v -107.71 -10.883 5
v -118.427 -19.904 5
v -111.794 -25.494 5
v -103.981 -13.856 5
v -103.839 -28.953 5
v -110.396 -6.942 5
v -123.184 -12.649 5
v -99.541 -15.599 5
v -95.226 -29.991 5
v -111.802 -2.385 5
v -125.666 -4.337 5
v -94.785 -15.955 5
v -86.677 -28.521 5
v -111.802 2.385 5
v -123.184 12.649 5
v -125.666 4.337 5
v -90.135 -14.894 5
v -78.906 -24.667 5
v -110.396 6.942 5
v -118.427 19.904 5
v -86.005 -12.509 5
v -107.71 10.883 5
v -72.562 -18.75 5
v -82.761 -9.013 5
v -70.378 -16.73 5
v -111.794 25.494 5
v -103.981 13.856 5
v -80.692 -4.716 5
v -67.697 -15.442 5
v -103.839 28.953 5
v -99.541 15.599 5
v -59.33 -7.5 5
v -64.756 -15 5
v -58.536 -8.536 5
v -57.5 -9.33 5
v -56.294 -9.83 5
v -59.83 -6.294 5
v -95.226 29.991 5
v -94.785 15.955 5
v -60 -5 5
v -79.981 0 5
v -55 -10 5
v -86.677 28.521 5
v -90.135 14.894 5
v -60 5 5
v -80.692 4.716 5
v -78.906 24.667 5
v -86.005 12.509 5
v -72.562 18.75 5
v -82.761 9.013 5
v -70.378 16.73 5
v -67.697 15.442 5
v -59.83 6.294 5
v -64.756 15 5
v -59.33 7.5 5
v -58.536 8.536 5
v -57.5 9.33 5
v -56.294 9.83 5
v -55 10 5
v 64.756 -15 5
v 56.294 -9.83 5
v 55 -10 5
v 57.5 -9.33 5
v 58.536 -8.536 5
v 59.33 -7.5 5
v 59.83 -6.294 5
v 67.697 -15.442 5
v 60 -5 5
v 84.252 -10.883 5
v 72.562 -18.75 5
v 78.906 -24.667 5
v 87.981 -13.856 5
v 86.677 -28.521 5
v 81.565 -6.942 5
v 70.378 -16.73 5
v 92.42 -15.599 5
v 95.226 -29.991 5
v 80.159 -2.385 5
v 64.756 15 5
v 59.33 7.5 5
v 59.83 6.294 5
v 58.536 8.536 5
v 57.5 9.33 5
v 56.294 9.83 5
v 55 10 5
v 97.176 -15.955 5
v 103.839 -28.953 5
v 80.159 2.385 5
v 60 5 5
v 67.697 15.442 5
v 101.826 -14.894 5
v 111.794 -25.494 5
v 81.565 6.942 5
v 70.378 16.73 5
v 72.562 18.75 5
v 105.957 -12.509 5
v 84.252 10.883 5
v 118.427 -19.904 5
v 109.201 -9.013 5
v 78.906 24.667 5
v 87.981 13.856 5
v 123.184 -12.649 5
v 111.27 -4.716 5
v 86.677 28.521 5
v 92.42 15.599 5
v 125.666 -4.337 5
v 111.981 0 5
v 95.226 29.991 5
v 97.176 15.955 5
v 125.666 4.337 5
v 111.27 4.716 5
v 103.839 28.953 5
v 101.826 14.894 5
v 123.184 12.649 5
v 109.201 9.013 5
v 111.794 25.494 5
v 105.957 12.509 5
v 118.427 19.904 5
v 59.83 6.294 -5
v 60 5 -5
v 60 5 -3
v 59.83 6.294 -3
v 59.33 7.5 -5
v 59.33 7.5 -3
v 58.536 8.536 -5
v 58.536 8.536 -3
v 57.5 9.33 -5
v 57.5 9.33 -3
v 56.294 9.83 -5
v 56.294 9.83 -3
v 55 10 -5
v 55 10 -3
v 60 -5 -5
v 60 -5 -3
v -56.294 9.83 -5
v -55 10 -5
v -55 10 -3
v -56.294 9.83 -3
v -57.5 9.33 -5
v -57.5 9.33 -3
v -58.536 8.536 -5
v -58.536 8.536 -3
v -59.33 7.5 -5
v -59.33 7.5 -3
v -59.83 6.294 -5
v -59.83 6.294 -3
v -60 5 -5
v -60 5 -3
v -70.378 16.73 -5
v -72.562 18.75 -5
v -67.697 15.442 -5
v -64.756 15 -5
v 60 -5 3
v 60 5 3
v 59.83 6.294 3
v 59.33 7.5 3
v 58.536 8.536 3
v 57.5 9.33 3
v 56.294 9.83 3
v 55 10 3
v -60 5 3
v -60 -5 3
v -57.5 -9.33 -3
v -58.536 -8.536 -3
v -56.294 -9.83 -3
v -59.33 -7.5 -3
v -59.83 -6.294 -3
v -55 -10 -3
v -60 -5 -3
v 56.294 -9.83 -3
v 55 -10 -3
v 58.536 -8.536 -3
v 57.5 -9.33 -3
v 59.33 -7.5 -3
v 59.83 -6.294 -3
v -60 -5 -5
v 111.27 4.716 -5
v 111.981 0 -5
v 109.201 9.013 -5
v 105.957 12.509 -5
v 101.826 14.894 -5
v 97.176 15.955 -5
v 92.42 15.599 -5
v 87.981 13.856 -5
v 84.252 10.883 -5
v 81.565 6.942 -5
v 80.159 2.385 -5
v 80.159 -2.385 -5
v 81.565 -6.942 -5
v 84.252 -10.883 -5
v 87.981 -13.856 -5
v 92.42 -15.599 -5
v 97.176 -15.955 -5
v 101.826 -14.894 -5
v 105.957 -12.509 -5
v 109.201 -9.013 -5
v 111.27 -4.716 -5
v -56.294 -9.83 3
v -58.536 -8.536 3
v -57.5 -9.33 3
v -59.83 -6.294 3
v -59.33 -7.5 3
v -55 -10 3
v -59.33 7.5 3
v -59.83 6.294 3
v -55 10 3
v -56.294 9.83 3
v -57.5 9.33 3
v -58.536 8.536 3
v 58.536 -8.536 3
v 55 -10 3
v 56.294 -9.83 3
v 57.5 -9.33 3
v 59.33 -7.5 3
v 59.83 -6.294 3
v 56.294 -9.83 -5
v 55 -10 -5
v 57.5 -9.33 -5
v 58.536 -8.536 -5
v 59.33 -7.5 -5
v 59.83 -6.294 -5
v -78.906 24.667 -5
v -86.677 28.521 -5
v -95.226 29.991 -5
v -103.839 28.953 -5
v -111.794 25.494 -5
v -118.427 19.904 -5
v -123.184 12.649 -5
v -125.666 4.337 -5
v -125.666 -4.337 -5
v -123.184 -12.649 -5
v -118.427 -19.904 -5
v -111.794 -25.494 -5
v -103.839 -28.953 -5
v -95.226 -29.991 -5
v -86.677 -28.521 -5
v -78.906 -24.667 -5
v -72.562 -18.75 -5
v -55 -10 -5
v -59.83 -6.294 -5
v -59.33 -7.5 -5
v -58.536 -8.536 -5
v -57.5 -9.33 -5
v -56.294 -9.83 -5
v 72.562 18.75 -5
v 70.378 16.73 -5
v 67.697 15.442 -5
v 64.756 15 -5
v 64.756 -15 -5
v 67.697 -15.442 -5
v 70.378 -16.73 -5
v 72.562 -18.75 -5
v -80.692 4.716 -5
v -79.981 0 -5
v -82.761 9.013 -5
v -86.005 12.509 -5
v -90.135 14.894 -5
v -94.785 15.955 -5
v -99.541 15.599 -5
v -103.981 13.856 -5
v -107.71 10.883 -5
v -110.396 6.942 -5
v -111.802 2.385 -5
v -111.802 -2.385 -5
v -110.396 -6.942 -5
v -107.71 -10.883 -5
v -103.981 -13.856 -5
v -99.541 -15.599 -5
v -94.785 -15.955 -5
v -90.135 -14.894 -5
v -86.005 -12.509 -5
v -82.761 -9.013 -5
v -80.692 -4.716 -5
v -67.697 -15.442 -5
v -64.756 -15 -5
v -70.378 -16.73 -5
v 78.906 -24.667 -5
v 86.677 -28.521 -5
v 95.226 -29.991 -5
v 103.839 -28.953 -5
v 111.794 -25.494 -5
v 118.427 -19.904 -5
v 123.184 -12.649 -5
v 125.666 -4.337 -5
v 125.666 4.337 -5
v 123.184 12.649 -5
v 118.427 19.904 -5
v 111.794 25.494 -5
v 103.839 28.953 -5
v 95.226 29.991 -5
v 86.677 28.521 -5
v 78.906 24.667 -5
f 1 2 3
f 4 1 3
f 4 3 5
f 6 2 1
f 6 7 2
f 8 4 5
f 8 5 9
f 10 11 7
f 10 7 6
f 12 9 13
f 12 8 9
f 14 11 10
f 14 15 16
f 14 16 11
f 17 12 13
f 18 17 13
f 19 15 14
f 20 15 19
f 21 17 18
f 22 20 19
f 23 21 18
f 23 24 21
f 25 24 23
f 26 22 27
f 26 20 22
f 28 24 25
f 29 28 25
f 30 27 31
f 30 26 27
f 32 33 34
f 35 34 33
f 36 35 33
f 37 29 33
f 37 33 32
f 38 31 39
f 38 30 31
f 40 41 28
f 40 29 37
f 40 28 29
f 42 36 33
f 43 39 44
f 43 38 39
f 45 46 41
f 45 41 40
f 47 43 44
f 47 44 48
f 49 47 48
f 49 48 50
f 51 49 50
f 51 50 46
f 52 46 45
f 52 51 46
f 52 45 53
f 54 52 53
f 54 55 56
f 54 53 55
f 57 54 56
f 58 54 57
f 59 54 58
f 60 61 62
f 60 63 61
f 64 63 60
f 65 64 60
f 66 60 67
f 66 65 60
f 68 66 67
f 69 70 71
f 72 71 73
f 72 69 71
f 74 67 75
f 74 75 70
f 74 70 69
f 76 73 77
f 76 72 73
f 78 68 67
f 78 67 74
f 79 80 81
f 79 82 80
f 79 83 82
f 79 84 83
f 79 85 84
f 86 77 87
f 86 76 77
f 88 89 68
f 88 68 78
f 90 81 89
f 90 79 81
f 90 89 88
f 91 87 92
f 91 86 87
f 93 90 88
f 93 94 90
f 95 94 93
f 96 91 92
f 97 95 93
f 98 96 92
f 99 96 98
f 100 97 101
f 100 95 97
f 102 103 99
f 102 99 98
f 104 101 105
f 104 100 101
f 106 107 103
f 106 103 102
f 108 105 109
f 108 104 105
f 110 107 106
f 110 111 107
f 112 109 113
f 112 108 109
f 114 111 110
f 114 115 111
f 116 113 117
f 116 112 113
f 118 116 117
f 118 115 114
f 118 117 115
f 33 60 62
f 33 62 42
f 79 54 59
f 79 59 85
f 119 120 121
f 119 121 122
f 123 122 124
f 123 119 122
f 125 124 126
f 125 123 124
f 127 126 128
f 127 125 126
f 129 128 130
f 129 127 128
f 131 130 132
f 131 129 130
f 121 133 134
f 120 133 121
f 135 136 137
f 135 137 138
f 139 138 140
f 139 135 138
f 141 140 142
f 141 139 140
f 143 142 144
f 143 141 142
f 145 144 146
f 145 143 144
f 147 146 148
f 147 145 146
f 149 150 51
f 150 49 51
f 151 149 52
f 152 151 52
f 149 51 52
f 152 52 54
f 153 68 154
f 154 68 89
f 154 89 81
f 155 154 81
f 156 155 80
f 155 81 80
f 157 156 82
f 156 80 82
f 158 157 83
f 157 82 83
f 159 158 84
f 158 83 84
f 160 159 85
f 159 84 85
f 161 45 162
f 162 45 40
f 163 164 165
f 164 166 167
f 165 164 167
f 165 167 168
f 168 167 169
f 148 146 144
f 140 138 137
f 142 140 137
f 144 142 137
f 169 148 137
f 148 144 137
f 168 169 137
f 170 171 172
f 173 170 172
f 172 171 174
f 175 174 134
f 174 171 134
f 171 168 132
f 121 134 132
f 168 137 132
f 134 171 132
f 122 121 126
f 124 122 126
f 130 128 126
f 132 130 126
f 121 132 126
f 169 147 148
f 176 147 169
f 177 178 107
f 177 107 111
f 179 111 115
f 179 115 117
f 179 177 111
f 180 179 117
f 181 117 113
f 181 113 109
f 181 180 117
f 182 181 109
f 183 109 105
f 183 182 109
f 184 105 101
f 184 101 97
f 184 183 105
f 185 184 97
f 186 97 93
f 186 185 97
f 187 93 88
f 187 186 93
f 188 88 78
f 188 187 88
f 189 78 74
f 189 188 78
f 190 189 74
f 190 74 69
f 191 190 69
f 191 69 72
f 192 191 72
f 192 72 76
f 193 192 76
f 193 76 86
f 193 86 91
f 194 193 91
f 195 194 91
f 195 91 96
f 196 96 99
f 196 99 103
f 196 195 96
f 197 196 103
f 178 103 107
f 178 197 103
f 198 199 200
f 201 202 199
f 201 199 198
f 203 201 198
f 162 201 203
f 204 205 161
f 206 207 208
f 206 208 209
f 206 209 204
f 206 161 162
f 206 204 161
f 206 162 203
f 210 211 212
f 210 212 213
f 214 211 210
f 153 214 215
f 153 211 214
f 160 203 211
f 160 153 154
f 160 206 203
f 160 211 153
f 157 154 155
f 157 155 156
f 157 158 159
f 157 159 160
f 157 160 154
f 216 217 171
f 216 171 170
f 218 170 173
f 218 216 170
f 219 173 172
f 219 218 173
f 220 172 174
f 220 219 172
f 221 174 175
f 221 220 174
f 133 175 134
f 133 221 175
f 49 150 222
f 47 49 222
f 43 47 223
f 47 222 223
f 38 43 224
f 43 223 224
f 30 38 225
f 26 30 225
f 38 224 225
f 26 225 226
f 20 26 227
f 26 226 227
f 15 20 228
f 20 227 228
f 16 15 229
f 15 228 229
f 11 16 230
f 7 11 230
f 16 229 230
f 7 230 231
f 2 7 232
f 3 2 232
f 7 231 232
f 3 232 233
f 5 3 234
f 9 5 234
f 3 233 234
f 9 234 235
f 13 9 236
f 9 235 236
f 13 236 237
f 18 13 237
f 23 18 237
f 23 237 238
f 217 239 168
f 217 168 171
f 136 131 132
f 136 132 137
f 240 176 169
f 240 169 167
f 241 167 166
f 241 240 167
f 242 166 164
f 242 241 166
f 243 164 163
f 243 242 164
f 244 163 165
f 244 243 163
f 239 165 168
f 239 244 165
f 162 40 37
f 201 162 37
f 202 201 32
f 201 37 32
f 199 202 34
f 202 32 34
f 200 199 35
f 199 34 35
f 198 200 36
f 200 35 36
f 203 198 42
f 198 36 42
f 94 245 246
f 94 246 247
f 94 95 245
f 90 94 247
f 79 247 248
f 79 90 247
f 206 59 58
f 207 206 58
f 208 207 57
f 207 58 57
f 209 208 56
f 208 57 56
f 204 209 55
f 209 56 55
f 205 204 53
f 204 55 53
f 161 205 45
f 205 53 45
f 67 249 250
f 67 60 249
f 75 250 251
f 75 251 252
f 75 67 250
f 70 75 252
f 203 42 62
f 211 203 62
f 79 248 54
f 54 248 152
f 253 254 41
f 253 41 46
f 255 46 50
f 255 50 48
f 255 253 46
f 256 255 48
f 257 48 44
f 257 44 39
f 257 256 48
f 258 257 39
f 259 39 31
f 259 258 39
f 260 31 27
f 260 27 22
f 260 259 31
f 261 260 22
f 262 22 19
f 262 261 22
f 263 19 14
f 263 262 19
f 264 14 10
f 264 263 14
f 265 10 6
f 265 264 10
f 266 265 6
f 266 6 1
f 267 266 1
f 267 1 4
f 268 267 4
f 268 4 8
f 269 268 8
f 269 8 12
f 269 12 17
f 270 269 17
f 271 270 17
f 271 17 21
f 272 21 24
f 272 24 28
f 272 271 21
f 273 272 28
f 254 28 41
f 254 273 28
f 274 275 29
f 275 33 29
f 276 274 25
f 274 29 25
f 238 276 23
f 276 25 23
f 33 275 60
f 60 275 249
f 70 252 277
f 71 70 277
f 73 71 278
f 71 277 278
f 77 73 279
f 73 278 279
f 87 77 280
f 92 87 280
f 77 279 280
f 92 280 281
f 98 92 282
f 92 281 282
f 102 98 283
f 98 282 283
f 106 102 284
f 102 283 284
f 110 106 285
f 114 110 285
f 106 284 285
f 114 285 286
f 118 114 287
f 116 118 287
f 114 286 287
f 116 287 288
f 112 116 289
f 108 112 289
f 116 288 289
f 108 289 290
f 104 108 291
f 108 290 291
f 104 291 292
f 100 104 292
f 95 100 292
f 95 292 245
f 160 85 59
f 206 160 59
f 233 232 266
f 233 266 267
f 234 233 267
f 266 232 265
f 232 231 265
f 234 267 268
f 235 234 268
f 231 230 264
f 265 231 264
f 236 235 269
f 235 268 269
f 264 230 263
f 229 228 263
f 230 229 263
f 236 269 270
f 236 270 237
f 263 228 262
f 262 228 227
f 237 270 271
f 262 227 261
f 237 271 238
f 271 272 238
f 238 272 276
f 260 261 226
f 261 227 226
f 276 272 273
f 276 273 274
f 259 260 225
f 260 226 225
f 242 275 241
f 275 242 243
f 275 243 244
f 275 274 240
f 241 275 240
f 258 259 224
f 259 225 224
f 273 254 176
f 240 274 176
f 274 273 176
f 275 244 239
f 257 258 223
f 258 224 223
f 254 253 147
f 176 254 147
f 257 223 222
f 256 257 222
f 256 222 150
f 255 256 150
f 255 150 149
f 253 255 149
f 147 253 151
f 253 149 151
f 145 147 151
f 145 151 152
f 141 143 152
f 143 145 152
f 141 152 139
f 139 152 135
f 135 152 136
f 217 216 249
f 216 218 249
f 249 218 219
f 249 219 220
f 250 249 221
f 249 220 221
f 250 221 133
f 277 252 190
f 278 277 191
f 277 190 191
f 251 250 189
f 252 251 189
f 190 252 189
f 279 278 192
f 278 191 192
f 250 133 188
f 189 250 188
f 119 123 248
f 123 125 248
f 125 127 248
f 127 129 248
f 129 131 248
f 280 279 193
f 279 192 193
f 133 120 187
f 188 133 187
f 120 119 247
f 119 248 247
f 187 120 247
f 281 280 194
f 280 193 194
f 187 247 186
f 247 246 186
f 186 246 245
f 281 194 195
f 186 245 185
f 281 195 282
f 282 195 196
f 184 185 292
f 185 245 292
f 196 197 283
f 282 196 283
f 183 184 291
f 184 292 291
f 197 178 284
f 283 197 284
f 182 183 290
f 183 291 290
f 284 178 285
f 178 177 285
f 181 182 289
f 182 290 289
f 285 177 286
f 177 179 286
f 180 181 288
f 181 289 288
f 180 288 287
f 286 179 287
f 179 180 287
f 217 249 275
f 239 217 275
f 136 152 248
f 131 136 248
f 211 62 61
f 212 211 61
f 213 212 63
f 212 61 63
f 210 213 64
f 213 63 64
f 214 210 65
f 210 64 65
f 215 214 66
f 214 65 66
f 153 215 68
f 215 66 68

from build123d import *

# Parameters (mm, degrees)
BOSS_EXTRUDE1_DEPTH      = 5
BOSS_EXTRUDE1_DEPTH_BACK = 5
SKETCH1_R                = 16
FILLET1_R                = 10
CUT_EXTRUDE1_DEPTH       = 2


with BuildPart() as part:
    # Sketch1 → Boss-Extrude1 (new, two sides: drawn at the far end of the back side and taken through both)
    with BuildSketch(Plane.XY.offset(-BOSS_EXTRUDE1_DEPTH_BACK)):
        with BuildLine():
            Line((-70, -15), (70, -15))
            ThreePointArc((70, -15), (125.980762114, 0), (70, 15))
            Line((70, 15), (-70, 15))
            ThreePointArc((-70, 15), (-125.980762114, 0), (-70, -15))
        make_face()
        with Locations((-95.980762114, 0)):
            Circle(SKETCH1_R, mode=Mode.SUBTRACT)
        with Locations((95.980762114, 0)):
            Circle(SKETCH1_R, mode=Mode.SUBTRACT)
    extrude(amount=BOSS_EXTRUDE1_DEPTH + BOSS_EXTRUDE1_DEPTH_BACK)

    # Fillet1
    fillet1_edges = [part.edges().sort_by_distance(p)[0] for p in [
        (70, -15, 0),
        (-70, -15, 0),
        (-70, 15, 0),
        (70, 15, 0),
    ]]
    fillet(fillet1_edges, radius=FILLET1_R)

    # Sketch2 → Cut-Extrude1 (cut)
    with BuildSketch(Plane.XY.offset(5)):
        with BuildLine():
            Line((55, 10), (-55, 10))
            ThreePointArc((-55, 10), (-58.535533906, 8.535533906), (-60, 5))
            Line((-60, 5), (-60, -5))
            ThreePointArc((-60, -5), (-58.535533906, -8.535533906), (-55, -10))
            Line((-55, -10), (55, -10))
            ThreePointArc((55, -10), (58.535533906, -8.535533906), (60, -5))
            Line((60, -5), (60, 5))
            ThreePointArc((60, 5), (58.535533906, 8.535533906), (55, 10))
        make_face()
    cut_extrude1 = extrude(amount=-CUT_EXTRUDE1_DEPTH, mode=Mode.SUBTRACT)

    # Mirror4: Cut-Extrude1 across plane
    add(cut_extrude1.mirror(Plane.XY), mode=Mode.SUBTRACT)


solid = part.part
